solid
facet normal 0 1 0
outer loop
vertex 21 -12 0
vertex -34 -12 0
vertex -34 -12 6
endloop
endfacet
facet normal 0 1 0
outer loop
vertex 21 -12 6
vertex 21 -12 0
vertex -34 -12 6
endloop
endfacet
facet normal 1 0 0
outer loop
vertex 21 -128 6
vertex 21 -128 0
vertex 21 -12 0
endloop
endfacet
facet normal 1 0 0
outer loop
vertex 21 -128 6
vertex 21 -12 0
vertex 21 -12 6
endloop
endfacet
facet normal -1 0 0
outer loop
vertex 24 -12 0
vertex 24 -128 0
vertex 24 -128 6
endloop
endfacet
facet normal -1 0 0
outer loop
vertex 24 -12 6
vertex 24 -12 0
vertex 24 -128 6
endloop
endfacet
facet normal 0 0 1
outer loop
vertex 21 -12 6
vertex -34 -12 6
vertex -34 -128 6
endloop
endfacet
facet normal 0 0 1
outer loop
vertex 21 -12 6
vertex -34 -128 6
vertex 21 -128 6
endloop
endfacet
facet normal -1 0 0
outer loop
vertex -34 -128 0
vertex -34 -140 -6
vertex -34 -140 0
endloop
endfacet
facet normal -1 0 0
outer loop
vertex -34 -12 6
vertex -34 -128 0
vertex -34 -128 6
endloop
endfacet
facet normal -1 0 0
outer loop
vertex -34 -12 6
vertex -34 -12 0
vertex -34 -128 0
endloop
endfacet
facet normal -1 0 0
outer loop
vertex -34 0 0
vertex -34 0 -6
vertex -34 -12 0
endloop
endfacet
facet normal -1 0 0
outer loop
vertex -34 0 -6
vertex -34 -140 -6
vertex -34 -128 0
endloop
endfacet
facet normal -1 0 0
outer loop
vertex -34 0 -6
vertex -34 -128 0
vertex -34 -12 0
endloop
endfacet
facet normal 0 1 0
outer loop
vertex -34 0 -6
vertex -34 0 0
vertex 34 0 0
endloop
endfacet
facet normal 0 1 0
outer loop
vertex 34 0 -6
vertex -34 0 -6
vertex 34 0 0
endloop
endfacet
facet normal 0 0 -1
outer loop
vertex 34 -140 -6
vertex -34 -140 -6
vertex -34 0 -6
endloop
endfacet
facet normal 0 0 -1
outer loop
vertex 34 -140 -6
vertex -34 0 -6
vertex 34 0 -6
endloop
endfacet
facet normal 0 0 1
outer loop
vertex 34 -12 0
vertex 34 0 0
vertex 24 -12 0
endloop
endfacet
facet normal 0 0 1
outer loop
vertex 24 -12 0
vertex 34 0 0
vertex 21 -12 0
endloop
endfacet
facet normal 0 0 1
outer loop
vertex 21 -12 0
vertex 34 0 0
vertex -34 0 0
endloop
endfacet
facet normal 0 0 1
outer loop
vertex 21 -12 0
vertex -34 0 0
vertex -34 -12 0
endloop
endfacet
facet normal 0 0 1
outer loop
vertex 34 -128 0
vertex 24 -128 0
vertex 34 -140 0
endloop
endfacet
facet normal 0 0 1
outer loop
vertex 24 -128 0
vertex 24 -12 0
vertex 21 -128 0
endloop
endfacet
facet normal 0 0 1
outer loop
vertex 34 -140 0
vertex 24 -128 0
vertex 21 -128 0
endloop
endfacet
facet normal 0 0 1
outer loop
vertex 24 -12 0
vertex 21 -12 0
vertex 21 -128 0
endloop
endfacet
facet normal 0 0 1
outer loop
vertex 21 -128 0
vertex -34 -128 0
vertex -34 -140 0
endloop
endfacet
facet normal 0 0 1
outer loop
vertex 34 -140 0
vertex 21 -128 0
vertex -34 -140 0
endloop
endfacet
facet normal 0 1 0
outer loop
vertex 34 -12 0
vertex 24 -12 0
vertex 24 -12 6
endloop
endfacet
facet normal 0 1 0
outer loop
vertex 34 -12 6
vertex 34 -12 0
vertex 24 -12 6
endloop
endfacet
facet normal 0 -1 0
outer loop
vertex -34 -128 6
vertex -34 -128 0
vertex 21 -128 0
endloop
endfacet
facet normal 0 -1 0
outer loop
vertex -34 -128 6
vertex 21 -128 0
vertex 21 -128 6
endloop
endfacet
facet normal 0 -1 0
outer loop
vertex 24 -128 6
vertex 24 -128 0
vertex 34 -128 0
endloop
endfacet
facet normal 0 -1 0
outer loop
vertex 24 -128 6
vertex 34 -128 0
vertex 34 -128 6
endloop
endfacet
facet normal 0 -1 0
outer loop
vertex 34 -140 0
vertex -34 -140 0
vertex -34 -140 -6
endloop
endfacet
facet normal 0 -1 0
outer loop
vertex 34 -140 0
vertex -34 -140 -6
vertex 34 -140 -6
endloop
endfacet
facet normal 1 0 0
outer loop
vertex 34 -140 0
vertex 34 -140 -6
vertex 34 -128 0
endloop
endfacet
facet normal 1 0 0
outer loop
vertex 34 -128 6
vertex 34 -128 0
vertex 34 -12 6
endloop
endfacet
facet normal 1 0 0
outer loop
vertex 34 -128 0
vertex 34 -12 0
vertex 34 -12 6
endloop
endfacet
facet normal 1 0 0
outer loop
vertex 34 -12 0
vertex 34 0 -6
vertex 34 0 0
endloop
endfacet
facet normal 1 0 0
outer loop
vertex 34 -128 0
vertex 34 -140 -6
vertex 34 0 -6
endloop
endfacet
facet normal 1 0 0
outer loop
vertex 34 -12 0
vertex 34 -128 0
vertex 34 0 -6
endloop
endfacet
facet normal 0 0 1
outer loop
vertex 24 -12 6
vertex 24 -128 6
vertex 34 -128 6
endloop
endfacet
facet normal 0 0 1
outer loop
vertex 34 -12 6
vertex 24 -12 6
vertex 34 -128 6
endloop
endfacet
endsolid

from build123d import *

# Parameters (mm, degrees)
F0_W     = 68
F0_H     = 12
F1_DEPTH = 140
F2_W     = 3
F2_H     = 6
F3_DEPTH = 140
F4_W     = 12
F4_H     = 6
F5_DEPTH = 70


with BuildPart() as f1:
    # F0 (on Front) → F1 (new body)
    with BuildSketch(Plane.XZ):
        Rectangle(F0_W, F0_H)
    extrude(amount=F1_DEPTH)

    # F2 (on face) → F3 (cut)
    with BuildSketch(Plane.XZ.offset(140)):
        with Locations((22.5, 3)):
            Rectangle(F2_W, F2_H)
    extrude(amount=-F3_DEPTH, mode=Mode.SUBTRACT)

    # F4 (on face) → F5 (cut)
    with BuildSketch(Plane(origin=(-34, 0, 0), x_dir=(0, -1, 0), z_dir=(-1, 0, 0))):
        with Locations((6, 3)):
            Rectangle(F4_W, F4_H)
        with Locations((134, 3)):
            Rectangle(F4_W, F4_H)
    extrude(amount=-F5_DEPTH, mode=Mode.SUBTRACT)


solid = f1.part
